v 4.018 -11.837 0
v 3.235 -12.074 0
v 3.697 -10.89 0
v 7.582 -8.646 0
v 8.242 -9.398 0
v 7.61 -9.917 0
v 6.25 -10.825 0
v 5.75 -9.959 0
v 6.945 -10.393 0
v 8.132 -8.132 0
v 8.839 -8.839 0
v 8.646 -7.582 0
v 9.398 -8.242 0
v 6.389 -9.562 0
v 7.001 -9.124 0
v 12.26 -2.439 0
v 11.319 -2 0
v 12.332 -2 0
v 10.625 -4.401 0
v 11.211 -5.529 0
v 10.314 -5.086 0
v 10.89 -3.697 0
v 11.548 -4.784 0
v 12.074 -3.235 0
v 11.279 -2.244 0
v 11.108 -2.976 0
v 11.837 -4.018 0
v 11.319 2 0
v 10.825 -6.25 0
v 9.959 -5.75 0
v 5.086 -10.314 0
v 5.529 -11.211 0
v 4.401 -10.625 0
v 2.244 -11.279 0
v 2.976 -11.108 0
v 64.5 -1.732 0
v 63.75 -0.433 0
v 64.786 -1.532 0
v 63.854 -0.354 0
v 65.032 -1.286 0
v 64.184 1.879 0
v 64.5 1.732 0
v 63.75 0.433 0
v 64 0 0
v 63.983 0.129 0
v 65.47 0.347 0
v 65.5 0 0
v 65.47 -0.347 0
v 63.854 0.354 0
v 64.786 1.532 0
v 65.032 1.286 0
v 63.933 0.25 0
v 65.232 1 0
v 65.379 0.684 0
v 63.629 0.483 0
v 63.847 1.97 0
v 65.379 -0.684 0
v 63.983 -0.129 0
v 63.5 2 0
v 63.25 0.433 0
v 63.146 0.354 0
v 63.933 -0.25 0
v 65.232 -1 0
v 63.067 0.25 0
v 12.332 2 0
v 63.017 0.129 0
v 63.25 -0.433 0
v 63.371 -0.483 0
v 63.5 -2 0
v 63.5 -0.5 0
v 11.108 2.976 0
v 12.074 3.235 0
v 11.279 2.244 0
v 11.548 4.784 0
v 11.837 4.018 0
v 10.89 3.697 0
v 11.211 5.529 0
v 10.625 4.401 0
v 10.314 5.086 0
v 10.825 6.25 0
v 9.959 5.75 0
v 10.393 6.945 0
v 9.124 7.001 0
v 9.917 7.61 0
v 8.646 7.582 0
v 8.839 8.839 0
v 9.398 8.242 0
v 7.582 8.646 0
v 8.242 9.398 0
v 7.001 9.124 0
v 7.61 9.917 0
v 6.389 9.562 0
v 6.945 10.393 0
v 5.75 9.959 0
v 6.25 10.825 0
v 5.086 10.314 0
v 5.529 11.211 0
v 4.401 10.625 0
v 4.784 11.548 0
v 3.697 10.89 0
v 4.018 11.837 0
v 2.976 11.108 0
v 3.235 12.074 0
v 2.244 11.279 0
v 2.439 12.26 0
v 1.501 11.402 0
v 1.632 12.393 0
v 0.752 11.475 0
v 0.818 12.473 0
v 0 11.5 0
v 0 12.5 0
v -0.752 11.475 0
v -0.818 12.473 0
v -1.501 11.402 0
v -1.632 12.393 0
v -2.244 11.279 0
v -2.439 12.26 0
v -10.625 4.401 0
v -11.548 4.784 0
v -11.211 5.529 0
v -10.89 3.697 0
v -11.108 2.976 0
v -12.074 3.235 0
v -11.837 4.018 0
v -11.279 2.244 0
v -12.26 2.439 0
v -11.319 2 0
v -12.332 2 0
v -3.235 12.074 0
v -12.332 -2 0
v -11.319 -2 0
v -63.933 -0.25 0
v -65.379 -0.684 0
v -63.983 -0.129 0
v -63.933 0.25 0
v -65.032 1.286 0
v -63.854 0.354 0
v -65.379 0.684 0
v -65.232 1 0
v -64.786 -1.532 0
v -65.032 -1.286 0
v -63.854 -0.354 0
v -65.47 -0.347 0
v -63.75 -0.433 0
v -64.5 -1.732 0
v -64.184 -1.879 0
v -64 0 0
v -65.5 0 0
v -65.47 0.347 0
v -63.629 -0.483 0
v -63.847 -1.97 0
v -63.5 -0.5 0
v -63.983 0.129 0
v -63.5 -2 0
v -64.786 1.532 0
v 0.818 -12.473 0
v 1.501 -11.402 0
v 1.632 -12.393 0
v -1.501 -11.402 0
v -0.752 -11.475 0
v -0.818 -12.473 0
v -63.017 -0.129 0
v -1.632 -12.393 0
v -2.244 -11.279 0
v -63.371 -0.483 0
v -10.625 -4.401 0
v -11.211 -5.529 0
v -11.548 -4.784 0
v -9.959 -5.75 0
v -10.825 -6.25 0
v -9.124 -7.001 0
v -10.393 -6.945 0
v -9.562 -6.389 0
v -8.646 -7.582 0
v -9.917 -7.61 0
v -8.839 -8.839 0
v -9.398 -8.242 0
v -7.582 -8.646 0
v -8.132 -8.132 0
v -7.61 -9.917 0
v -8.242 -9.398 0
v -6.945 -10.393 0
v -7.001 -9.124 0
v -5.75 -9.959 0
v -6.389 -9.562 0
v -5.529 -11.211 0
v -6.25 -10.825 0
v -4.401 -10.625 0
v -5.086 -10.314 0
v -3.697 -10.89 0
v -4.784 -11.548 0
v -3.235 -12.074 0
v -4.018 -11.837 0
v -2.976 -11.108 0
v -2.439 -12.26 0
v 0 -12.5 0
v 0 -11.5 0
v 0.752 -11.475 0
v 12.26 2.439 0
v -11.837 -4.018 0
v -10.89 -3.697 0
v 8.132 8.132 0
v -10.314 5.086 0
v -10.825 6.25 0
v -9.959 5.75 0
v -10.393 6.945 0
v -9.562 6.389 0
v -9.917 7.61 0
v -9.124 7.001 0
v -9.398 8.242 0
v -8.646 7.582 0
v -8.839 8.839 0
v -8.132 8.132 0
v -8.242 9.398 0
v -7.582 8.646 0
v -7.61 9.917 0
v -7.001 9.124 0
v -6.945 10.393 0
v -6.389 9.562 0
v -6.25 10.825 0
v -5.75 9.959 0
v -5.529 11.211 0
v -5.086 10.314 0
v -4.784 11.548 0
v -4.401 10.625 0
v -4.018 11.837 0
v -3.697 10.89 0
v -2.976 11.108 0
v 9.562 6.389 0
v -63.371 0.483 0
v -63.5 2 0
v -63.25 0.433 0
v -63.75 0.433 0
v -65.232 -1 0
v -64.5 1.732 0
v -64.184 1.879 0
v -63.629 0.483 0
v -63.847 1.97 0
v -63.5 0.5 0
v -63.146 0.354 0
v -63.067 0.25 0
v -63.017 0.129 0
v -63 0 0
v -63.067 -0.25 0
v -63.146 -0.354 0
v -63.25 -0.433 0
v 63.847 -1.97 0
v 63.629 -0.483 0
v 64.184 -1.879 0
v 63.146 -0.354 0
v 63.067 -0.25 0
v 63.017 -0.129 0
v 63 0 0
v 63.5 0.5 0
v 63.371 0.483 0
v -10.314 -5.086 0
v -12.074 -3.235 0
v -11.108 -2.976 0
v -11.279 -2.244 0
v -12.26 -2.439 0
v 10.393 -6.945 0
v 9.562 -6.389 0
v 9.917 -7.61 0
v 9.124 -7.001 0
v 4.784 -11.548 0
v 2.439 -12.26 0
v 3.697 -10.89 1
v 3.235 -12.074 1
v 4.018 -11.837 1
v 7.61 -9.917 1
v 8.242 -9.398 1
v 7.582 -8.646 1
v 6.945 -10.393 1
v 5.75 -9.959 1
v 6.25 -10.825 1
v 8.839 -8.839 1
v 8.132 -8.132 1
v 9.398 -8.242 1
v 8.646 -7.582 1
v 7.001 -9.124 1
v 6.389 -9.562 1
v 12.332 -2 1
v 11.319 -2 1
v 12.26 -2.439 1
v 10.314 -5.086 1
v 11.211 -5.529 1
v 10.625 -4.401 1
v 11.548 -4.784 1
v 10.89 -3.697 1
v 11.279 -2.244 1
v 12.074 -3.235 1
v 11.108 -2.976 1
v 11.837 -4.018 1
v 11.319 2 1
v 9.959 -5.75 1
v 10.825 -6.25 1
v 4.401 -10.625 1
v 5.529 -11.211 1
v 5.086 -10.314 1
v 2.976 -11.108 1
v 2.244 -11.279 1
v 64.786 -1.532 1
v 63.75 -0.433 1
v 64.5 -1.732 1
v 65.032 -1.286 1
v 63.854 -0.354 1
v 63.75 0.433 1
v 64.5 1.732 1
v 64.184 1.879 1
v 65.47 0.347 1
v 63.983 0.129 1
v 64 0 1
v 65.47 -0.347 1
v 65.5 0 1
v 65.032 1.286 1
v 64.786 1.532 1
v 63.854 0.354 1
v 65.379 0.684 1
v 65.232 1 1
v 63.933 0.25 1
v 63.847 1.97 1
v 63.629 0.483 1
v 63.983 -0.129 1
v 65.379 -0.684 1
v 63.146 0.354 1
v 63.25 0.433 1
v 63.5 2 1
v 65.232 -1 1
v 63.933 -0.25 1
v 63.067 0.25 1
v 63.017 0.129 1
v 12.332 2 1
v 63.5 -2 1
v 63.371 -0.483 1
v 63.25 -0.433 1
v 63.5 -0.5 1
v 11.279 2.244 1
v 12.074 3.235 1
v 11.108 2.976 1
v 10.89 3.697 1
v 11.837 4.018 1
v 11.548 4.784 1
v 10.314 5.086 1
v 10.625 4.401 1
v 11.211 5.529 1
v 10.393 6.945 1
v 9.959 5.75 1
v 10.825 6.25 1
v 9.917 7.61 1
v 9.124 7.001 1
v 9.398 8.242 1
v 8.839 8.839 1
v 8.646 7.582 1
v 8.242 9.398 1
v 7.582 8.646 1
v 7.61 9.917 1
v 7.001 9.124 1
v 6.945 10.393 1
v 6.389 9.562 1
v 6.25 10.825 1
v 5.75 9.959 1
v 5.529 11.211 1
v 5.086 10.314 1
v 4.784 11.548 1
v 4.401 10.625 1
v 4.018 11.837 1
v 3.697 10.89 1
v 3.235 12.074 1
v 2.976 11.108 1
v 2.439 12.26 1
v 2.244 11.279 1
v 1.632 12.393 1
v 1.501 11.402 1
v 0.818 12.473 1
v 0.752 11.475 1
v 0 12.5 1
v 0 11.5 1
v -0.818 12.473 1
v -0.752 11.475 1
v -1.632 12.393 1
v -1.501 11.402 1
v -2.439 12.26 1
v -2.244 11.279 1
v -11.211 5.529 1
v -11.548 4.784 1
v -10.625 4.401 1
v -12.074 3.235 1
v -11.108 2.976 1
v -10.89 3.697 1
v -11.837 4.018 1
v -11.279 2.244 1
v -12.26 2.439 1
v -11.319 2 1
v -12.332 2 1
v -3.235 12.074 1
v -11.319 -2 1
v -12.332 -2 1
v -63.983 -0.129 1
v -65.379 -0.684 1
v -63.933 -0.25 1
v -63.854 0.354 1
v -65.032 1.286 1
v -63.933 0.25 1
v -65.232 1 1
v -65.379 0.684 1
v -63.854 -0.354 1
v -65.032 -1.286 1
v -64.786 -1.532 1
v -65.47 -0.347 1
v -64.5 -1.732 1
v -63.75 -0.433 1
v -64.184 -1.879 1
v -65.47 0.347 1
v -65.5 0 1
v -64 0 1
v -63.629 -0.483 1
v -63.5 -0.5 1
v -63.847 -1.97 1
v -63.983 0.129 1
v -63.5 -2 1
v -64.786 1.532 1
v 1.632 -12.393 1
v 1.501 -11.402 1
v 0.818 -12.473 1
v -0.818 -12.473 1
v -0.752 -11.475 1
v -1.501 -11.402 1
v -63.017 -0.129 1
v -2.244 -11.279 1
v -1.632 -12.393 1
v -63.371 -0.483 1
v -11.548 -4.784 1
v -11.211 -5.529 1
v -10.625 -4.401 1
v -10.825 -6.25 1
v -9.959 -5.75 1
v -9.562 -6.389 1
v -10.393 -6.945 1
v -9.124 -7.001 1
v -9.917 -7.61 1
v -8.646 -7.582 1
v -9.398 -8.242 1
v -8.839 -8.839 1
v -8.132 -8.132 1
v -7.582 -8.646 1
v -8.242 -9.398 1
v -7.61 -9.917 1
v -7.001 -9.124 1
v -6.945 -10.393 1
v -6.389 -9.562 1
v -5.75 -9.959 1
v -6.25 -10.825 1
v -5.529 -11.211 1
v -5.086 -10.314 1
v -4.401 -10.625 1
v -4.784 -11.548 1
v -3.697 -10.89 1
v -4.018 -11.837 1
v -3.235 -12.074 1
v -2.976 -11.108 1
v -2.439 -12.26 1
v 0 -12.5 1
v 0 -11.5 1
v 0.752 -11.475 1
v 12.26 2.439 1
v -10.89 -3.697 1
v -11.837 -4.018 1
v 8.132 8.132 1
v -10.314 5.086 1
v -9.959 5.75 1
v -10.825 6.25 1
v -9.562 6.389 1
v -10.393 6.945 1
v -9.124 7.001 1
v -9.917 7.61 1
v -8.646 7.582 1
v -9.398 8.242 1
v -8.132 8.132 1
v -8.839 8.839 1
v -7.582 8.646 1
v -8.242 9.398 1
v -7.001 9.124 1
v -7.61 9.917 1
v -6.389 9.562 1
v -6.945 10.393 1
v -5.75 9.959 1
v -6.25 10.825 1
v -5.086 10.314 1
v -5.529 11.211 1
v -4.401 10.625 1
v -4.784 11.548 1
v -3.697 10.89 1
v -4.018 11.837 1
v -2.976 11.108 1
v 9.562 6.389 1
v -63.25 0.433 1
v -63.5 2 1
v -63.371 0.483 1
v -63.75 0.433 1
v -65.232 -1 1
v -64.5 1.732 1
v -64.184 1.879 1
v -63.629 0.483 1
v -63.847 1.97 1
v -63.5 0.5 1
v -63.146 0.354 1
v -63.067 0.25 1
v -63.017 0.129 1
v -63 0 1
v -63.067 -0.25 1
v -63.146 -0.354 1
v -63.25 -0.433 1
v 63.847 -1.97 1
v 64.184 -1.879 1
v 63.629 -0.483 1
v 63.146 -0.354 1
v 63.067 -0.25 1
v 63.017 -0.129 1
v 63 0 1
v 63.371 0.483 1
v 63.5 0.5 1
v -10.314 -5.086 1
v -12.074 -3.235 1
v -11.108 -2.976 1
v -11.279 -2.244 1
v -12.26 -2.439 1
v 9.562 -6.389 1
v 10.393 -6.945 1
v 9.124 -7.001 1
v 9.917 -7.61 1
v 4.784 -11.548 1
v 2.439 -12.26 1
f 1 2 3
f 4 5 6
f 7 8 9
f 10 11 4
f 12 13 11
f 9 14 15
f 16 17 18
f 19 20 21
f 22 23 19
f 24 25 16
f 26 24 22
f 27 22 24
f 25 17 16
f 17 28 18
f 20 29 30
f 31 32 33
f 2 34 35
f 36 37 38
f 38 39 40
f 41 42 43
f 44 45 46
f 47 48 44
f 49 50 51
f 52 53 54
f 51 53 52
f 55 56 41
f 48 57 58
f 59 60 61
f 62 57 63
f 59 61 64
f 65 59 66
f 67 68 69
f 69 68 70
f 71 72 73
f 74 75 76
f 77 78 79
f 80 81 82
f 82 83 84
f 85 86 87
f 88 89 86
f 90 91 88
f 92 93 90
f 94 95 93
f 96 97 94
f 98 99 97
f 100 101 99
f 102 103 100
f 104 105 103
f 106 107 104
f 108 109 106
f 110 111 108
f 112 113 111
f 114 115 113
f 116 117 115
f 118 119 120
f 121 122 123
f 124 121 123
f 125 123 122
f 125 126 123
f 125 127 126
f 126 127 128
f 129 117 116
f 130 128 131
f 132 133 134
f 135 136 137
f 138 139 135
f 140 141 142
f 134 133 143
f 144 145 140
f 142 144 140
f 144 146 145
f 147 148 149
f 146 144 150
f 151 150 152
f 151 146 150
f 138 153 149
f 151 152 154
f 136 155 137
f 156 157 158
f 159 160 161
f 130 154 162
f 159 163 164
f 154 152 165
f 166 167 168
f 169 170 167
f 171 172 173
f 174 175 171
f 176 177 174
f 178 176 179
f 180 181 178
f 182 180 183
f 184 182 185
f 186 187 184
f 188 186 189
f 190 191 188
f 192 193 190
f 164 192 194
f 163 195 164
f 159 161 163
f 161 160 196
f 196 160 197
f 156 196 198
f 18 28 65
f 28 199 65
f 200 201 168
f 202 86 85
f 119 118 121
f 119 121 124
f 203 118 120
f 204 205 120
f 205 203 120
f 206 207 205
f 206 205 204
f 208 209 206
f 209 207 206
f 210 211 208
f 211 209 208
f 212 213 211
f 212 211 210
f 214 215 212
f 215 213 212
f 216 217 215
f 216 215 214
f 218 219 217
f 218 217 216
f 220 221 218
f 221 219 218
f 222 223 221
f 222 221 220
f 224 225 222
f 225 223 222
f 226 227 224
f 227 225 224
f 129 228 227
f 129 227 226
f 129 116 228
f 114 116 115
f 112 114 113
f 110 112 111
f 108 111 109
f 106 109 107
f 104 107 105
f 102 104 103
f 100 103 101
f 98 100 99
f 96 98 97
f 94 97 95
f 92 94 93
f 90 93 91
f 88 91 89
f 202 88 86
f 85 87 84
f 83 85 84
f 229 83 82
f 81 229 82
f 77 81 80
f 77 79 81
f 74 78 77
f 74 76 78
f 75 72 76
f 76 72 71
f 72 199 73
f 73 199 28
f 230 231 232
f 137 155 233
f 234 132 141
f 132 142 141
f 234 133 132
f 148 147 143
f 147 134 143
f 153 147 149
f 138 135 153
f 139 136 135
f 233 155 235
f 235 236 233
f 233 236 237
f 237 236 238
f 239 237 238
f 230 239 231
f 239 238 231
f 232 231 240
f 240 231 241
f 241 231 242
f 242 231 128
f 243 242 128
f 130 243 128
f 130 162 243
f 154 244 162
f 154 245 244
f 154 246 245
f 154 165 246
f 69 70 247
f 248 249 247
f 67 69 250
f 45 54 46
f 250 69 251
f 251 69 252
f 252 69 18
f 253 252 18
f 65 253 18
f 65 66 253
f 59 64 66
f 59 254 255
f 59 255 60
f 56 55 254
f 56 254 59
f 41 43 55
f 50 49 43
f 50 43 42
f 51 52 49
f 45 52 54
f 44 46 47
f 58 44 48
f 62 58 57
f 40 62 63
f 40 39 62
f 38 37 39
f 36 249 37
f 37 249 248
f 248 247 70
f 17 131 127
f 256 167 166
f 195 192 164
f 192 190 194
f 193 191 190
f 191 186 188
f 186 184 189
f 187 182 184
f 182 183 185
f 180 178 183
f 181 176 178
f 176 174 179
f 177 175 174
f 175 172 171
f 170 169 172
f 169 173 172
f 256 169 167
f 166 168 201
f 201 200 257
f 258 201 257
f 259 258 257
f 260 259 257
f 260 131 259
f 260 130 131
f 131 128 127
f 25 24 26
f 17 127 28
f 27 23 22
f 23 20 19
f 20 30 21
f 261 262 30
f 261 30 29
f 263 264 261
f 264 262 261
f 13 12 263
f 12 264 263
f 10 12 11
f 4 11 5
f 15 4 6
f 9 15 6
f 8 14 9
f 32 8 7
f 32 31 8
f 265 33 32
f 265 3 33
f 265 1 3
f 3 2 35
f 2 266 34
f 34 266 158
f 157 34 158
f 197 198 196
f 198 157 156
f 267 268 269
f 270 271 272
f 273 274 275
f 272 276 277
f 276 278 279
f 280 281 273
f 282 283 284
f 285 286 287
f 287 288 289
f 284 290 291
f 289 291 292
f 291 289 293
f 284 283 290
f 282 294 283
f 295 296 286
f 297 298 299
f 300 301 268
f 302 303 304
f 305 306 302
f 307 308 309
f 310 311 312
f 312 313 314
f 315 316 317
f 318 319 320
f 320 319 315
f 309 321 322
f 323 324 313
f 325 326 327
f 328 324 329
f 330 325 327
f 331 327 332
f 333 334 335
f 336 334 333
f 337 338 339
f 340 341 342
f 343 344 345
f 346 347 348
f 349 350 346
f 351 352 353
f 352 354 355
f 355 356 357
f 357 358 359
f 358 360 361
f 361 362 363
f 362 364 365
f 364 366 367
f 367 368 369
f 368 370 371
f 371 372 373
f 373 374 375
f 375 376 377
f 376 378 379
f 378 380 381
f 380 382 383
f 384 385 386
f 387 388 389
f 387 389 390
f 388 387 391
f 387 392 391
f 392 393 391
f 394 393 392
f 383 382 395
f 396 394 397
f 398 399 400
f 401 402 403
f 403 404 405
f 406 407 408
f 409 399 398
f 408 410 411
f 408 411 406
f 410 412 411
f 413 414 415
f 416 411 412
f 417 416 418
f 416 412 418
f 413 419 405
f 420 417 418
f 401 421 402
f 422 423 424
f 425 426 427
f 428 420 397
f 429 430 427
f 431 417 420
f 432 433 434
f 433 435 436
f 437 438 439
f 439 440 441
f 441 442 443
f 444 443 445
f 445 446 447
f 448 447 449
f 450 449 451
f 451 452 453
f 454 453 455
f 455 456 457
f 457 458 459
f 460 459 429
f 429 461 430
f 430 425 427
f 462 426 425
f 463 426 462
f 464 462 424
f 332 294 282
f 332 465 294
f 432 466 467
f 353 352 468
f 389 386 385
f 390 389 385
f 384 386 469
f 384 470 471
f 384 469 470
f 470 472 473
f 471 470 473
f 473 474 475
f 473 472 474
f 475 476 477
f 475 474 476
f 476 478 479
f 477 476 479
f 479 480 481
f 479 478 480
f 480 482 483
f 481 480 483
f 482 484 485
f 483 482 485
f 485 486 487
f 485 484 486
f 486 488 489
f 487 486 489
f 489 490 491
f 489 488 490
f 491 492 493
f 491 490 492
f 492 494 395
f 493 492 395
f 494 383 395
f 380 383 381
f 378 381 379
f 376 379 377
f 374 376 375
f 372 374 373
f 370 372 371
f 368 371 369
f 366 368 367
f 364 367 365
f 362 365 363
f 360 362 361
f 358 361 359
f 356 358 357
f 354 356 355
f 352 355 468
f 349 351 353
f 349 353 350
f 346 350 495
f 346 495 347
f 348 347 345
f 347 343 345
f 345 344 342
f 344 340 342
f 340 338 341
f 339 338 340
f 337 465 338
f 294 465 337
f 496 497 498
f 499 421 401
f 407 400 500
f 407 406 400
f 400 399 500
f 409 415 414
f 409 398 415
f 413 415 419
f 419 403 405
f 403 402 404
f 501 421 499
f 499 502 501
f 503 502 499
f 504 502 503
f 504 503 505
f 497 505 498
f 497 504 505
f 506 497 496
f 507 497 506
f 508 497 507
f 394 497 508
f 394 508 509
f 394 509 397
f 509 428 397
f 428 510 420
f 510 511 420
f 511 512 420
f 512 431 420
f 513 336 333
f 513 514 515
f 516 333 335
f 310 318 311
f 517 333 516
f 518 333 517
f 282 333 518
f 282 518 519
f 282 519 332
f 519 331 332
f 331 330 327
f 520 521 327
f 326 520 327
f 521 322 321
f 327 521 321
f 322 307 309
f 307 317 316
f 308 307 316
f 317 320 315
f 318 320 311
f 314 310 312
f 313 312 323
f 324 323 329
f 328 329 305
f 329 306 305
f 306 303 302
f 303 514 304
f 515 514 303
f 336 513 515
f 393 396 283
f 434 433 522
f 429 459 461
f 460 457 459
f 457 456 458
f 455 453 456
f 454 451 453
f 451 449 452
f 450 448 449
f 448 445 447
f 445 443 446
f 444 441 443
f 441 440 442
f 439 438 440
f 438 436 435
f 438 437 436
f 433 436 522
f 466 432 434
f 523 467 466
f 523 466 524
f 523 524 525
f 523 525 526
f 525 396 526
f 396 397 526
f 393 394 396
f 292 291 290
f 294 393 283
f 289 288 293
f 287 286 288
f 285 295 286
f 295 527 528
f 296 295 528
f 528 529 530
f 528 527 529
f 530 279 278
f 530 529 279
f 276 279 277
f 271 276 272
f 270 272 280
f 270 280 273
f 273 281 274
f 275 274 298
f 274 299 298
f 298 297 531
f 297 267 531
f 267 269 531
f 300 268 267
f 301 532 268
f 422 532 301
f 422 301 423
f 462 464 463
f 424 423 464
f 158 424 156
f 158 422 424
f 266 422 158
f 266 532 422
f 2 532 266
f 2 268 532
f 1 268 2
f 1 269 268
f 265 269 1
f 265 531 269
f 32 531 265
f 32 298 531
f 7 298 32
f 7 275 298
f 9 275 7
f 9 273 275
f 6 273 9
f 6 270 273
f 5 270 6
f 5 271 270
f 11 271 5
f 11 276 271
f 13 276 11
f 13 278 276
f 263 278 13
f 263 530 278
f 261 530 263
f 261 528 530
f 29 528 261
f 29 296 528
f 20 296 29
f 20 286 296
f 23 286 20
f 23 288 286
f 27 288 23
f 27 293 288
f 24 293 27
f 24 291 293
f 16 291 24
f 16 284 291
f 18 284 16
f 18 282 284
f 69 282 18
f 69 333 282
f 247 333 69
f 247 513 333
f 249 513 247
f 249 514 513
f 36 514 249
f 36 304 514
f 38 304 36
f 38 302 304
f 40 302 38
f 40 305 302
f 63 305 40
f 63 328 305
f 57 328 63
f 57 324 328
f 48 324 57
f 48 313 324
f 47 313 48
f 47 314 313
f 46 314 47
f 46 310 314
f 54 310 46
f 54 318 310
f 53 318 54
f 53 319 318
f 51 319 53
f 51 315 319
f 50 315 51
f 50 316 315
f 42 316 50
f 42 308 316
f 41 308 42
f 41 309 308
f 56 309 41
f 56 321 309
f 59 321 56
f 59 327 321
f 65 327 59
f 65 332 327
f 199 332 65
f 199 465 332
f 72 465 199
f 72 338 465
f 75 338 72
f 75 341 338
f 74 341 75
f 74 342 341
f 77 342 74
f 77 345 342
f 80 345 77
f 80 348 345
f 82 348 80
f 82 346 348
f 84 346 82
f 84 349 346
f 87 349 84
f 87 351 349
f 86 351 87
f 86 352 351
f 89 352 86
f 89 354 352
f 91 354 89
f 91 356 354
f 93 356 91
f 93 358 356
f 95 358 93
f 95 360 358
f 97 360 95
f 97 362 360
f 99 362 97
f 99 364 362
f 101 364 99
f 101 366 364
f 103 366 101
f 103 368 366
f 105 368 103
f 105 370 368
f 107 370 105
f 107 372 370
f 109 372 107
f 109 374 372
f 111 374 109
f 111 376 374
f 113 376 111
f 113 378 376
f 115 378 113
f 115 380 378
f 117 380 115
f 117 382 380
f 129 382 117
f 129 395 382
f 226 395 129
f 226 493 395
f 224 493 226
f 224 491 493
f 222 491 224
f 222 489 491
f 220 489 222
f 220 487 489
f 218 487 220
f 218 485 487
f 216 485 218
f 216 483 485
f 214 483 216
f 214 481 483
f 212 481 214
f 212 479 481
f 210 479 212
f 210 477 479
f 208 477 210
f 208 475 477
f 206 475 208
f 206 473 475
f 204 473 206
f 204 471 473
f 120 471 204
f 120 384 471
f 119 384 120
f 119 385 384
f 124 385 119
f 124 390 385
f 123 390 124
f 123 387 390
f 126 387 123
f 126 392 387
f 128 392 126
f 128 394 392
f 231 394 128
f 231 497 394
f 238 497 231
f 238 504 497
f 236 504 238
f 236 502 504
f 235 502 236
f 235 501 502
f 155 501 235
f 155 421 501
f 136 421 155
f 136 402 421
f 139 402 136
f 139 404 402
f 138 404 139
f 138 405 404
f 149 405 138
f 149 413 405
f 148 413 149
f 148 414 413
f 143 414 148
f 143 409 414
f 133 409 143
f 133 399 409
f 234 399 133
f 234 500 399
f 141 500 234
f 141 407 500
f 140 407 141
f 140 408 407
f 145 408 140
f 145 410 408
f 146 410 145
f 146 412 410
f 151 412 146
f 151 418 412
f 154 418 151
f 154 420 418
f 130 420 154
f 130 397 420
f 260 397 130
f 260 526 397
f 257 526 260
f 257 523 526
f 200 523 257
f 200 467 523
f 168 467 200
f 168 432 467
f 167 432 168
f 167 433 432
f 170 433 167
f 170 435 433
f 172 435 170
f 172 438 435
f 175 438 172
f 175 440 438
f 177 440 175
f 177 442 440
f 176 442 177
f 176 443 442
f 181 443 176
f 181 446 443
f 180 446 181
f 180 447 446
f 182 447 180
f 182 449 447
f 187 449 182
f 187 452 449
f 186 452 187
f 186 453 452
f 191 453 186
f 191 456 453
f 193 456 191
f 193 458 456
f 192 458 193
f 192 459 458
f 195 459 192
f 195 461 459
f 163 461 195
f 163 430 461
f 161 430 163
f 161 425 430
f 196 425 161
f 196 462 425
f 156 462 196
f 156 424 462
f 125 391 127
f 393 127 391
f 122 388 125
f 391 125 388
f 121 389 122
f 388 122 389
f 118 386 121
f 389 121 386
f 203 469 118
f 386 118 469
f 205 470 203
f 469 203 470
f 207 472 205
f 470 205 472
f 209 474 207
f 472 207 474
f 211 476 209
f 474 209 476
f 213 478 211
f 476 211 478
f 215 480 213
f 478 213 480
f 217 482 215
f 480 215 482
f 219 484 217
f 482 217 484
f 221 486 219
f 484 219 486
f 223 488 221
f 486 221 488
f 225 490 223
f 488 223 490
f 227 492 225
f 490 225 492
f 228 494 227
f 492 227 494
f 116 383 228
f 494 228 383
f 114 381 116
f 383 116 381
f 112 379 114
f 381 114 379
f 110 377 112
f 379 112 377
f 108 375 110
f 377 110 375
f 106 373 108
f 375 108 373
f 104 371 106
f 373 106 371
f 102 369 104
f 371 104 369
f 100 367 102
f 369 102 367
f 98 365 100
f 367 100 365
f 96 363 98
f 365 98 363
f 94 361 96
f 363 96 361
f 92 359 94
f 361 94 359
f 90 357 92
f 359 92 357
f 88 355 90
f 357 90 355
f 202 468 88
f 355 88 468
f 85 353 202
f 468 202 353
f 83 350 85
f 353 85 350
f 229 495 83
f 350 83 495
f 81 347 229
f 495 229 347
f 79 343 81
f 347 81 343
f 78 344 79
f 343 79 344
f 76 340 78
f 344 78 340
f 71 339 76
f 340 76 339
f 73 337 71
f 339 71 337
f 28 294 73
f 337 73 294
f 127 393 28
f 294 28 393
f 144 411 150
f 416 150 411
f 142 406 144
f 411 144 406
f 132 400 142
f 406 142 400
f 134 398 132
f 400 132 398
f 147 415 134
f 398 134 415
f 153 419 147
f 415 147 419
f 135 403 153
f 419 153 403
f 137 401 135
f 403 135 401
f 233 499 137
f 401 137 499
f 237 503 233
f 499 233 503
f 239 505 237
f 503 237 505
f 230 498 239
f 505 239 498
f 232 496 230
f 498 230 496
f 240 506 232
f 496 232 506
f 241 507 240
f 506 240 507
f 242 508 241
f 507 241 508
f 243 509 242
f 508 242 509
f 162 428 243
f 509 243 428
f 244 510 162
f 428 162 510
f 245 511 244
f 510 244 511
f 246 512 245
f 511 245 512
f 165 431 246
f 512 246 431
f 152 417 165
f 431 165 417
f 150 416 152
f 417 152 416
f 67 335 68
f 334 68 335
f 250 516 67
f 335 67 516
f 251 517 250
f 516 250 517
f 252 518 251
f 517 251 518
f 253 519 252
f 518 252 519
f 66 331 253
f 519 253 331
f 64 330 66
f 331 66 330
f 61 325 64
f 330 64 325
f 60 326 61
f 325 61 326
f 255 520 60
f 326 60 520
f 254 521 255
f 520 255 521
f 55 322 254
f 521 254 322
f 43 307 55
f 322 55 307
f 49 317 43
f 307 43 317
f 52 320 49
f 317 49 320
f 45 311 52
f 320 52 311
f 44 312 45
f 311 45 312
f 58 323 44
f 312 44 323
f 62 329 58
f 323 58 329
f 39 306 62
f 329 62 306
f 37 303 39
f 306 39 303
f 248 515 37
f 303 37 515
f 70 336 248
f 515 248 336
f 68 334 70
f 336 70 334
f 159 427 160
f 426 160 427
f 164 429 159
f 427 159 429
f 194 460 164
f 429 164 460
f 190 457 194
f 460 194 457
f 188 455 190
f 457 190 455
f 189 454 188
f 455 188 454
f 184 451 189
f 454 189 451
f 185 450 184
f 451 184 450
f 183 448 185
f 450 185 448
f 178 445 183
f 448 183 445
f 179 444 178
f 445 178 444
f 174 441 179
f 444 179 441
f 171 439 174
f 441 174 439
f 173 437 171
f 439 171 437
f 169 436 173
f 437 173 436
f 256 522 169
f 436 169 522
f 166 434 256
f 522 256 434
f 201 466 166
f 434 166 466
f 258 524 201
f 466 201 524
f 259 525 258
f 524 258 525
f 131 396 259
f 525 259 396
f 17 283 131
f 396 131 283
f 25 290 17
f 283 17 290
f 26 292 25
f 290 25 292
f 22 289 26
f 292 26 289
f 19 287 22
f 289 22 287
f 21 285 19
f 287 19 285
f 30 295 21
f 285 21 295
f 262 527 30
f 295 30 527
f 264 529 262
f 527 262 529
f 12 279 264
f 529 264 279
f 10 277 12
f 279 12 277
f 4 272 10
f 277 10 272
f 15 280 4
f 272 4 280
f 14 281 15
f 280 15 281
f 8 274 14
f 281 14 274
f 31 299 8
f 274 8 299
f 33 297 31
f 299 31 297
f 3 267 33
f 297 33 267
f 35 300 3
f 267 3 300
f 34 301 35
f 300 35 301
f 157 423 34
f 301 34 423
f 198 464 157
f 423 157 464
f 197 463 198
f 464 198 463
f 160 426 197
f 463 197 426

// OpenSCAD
// part_id: dat1
// name: Date pointer arm with central ring
// source_drawing_ids: DRW-008
// units: mm
// revision: 0.1
// SPDX-License-Identifier: MIT

module dat1_profile_2d(
    arm_len = 63.5,
    arm_w = 4.0,
    hub_od = 25.0,
    hub_id = 23.0,
    end_hole_d = 1.0
) {
    difference() {
        union() {
            hull() {
                translate([-arm_len, 0]) circle(d = arm_w, $fn = 36);
                circle(d = arm_w, $fn = 36);
            }
            hull() {
                translate([arm_len, 0]) circle(d = arm_w, $fn = 36);
                circle(d = arm_w, $fn = 36);
            }
            difference() {
                circle(d = hub_od, $fn = 96);
                circle(d = hub_id, $fn = 96);
            }
        }
        translate([-arm_len, 0]) circle(d = end_hole_d, $fn = 24);
        translate([arm_len, 0]) circle(d = end_hole_d, $fn = 24);
    }
}

module part_dat1(thickness = 1.0) {
    linear_extrude(height = thickness) dat1_profile_2d();
}

// ---- "main guard" ----
// Default to previewing when opened directly:
if (is_undef(__LIB_MODE__)) {
    part_dat1();
}
